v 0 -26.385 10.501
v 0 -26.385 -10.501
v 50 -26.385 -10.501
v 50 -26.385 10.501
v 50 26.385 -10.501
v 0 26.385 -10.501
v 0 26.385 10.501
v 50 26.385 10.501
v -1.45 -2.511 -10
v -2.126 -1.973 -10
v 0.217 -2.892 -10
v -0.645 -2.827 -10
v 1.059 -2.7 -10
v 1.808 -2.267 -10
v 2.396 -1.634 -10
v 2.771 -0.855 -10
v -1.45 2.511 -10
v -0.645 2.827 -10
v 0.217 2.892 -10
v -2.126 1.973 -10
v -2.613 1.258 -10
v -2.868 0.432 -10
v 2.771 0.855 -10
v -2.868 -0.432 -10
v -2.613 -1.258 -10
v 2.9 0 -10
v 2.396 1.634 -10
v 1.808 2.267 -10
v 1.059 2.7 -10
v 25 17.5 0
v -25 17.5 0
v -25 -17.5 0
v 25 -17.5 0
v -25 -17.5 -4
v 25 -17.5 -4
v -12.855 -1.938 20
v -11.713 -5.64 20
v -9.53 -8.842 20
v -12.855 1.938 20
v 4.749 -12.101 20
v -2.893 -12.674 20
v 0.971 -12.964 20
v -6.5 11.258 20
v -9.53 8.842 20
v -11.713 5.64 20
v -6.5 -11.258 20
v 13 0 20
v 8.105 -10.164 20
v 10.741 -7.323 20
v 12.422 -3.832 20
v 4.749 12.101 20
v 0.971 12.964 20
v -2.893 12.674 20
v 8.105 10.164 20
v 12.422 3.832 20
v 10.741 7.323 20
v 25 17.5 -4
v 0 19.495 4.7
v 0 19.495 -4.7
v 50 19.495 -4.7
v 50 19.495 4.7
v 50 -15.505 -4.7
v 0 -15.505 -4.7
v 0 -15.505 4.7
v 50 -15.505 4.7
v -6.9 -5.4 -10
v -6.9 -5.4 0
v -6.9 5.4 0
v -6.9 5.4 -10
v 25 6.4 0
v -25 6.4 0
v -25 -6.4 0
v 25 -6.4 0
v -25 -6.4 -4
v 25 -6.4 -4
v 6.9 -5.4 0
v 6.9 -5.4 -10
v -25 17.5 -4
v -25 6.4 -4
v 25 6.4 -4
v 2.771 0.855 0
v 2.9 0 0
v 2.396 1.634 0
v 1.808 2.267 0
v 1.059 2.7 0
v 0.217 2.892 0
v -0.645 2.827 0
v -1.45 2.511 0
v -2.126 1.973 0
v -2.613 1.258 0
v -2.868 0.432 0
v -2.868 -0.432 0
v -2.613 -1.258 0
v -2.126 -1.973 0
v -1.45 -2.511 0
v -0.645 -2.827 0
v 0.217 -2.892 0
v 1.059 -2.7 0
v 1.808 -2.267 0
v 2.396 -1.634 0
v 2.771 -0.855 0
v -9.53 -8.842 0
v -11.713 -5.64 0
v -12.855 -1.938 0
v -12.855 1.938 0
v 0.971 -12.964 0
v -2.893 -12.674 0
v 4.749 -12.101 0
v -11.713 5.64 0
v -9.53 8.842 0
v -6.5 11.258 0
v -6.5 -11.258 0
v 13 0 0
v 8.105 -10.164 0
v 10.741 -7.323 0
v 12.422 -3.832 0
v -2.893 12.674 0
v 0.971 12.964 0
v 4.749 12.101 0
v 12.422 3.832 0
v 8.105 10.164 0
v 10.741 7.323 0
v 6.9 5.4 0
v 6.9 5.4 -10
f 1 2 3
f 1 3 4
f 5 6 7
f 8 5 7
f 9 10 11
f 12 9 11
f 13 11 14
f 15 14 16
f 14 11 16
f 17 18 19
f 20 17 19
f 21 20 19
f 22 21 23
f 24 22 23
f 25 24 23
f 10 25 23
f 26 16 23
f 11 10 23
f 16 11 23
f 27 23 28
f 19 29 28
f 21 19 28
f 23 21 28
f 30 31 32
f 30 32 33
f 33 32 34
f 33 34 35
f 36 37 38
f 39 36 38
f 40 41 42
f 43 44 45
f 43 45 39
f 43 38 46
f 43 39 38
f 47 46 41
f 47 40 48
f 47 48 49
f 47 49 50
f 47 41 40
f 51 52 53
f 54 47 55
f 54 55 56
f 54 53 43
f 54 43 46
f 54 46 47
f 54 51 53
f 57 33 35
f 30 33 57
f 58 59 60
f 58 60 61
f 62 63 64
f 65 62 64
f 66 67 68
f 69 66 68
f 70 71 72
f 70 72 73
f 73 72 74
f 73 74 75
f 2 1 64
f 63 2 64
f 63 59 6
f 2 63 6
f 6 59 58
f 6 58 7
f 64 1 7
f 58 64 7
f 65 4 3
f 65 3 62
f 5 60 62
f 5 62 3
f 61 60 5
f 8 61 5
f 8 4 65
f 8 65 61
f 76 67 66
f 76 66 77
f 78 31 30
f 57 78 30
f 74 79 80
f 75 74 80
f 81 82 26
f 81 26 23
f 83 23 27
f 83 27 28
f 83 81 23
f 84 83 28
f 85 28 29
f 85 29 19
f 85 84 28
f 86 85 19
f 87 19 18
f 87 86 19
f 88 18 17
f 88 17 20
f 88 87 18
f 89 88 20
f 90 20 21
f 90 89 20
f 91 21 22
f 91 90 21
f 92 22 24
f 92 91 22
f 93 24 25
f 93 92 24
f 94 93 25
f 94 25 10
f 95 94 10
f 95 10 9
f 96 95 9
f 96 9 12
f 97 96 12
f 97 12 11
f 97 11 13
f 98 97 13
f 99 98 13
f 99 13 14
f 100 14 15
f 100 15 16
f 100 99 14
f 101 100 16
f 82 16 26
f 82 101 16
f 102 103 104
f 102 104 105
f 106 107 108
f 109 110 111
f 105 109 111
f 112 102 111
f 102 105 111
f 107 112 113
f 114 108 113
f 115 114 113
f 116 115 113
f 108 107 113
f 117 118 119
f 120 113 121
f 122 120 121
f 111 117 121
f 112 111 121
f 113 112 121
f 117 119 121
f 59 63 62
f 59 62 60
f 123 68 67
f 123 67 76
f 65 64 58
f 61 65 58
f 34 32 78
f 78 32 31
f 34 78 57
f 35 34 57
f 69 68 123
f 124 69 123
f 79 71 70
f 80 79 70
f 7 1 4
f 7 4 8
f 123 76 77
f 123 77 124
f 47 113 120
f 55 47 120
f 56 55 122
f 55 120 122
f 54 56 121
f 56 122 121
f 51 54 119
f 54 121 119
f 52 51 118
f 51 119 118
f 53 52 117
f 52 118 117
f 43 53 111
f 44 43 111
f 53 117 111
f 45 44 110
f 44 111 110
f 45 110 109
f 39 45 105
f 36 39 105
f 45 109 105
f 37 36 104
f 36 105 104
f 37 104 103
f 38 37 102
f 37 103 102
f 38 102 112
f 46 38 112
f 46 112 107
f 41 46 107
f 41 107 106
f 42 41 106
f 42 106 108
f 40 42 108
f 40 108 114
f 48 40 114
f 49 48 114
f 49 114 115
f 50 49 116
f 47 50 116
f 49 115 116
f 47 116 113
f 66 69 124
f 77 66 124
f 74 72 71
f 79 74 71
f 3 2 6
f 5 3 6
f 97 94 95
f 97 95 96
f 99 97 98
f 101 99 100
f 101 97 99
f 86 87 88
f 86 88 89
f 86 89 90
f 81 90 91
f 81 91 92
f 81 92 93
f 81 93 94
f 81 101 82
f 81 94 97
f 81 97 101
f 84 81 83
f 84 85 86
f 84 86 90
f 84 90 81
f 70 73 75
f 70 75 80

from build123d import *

# Parameters (mm, degrees)
F0_R      = 13
F1_DEPTH  = 20
F2_W      = 13.8
F2_H      = 10.8
F3_DEPTH  = 10
F4_R      = 2.9
F5_DEPTH  = 10
F6_W      = 50
F6_H      = 12.8
F7_DEPTH  = 4
F8_W      = 50
F8_H      = 35
F9_DEPTH  = 4
F10_W     = 52.769538
F10_H     = 21.002858
F10_W_2   = 35
F10_H_2   = 9.4
F11_DEPTH = 50


with BuildPart() as f1:
    # F0 (on Top) → F1 (new body)
    with BuildSketch(Plane.XY):
        Circle(F0_R)
    extrude(amount=F1_DEPTH)


with BuildPart() as f3:
    # F2 (on Top) → F3 (new body)
    with BuildSketch(Plane.XY):
        Rectangle(F2_W, F2_H)
    extrude(amount=-F3_DEPTH)


with BuildPart() as f5:
    # F4 (on Top) → F5 (new body)
    with BuildSketch(Plane.XY):
        Circle(F4_R)
    extrude(amount=-F5_DEPTH)


with BuildPart() as f7:
    # F6 (on Top) → F7 (new body)
    with BuildSketch(Plane.XY):
        Rectangle(F6_W, F6_H)
    extrude(amount=-F7_DEPTH)


with BuildPart() as f9:
    # F8 (on Top) → F9 (new body)
    with BuildSketch(Plane.XY):
        Rectangle(F8_W, F8_H)
    extrude(amount=-F9_DEPTH)


with BuildPart() as f11:
    # F10 (on Right) → F11 (new body)
    with BuildSketch(Plane.YZ):
        Rectangle(F10_W, F10_H)
        with Locations((1.995266, 0)):
            Rectangle(F10_W_2, F10_H_2, mode=Mode.SUBTRACT)
    extrude(amount=F11_DEPTH)


solid = Compound([f1.part, f3.part, f5.part, f7.part, f9.part, f11.part])
